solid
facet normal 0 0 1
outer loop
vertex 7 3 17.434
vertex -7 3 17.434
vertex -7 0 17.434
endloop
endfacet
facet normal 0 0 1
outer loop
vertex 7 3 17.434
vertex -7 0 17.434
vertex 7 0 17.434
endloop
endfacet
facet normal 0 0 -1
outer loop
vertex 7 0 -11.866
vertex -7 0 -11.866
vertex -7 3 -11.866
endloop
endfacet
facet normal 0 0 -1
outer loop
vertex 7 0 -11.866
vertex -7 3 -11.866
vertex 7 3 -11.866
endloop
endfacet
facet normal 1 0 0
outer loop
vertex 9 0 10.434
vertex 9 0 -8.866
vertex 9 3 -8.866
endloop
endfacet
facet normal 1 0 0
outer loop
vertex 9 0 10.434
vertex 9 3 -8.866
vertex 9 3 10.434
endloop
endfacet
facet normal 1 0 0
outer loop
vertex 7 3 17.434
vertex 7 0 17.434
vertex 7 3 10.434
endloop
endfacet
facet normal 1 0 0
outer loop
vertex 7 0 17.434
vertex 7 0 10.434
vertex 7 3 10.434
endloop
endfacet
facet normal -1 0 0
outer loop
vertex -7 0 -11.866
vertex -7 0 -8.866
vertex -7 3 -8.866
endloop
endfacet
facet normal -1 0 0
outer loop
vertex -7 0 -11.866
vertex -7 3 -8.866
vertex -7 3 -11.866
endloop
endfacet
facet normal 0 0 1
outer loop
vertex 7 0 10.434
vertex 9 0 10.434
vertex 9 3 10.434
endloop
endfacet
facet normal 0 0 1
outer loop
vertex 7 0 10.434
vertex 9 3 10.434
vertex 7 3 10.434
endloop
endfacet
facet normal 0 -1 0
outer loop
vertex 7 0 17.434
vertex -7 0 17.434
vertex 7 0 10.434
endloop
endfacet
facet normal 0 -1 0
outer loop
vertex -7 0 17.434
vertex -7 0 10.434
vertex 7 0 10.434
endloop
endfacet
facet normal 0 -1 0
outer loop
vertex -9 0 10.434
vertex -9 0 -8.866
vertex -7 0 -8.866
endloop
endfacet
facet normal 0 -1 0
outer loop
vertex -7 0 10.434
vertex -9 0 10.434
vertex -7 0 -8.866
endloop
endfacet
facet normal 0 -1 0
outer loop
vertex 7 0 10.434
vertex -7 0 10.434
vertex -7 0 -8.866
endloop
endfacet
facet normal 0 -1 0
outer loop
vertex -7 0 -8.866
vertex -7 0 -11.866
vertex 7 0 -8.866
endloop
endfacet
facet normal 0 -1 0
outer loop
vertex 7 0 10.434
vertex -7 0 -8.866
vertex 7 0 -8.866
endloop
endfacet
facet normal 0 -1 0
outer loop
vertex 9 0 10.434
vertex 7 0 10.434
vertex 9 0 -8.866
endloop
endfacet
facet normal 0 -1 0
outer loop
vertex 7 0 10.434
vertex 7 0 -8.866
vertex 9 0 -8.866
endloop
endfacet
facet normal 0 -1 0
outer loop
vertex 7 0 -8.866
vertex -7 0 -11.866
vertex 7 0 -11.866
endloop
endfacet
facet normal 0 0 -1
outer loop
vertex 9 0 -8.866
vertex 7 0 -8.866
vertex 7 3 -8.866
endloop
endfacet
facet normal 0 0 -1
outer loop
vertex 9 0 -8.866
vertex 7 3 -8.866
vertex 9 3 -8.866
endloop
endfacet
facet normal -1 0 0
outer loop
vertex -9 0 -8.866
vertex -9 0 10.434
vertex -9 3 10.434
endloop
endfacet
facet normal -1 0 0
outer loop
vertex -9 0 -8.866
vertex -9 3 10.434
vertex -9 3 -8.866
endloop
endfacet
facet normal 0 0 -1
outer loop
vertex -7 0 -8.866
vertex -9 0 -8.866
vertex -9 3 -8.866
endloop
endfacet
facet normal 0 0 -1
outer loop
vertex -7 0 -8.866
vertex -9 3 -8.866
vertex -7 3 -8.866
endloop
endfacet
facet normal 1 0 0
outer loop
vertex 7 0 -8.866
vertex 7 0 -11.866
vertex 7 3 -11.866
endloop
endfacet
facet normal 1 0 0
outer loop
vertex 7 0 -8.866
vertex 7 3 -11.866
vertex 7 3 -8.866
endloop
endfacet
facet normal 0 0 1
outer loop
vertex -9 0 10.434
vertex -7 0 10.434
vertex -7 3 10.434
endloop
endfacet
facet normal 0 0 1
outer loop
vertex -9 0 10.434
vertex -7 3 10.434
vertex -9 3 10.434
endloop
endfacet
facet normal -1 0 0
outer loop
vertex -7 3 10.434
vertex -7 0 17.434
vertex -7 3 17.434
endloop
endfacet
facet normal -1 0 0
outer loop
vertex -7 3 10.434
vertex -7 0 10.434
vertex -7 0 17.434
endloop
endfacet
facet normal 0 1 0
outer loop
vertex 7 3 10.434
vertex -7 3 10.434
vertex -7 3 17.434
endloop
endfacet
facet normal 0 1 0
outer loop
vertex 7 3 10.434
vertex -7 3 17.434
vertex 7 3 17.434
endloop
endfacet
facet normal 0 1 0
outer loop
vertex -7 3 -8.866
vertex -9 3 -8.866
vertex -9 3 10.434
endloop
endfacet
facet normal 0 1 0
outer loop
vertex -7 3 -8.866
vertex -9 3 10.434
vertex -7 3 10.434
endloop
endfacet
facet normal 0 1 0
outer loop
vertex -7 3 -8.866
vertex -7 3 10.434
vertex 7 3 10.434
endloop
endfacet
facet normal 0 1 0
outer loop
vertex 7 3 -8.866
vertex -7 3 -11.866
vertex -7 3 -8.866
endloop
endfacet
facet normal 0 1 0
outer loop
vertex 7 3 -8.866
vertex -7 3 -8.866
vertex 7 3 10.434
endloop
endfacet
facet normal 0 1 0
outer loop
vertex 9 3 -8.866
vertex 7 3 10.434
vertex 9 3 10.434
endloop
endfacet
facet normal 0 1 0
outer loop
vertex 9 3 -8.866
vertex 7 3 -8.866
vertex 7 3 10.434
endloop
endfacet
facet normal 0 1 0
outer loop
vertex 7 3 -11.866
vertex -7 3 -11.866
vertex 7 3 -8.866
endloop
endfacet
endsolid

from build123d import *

# Parameters (mm, degrees)
EXTRUDE_1_DEPTH = 3
SKETCH_3_W      = 14
SKETCH_3_H      = 3
EXTRUDE_2_DEPTH = 4


with BuildPart() as part:
    # Эскиз1 → Бобышка-Вытянуть1 (new body)
    with BuildSketch(Plane(origin=(0, 0, 0), x_dir=(1, 0, 0), z_dir=(0, 1, 0))):
        Polygon((-9, -10.434482278), (-9, 8.865517722), (-7, 8.865517722), (-7, 11.865517722), (7, 11.865517722), (7, 8.865517722), (9, 8.865517722), (9, -10.434482278), (7, -10.434482278), (7, -13.434482278), (-7, -13.434482278), (-7, -10.434482278), align=None)
    extrude(amount=EXTRUDE_1_DEPTH)

    # Эскиз3 → Бобышка-Вытянуть2 (add)
    with BuildSketch(Plane.XY.offset(13.434482278)):
        with Locations((0, 1.5)):
            Rectangle(SKETCH_3_W, SKETCH_3_H)
    extrude(amount=EXTRUDE_2_DEPTH)


solid = part.part
